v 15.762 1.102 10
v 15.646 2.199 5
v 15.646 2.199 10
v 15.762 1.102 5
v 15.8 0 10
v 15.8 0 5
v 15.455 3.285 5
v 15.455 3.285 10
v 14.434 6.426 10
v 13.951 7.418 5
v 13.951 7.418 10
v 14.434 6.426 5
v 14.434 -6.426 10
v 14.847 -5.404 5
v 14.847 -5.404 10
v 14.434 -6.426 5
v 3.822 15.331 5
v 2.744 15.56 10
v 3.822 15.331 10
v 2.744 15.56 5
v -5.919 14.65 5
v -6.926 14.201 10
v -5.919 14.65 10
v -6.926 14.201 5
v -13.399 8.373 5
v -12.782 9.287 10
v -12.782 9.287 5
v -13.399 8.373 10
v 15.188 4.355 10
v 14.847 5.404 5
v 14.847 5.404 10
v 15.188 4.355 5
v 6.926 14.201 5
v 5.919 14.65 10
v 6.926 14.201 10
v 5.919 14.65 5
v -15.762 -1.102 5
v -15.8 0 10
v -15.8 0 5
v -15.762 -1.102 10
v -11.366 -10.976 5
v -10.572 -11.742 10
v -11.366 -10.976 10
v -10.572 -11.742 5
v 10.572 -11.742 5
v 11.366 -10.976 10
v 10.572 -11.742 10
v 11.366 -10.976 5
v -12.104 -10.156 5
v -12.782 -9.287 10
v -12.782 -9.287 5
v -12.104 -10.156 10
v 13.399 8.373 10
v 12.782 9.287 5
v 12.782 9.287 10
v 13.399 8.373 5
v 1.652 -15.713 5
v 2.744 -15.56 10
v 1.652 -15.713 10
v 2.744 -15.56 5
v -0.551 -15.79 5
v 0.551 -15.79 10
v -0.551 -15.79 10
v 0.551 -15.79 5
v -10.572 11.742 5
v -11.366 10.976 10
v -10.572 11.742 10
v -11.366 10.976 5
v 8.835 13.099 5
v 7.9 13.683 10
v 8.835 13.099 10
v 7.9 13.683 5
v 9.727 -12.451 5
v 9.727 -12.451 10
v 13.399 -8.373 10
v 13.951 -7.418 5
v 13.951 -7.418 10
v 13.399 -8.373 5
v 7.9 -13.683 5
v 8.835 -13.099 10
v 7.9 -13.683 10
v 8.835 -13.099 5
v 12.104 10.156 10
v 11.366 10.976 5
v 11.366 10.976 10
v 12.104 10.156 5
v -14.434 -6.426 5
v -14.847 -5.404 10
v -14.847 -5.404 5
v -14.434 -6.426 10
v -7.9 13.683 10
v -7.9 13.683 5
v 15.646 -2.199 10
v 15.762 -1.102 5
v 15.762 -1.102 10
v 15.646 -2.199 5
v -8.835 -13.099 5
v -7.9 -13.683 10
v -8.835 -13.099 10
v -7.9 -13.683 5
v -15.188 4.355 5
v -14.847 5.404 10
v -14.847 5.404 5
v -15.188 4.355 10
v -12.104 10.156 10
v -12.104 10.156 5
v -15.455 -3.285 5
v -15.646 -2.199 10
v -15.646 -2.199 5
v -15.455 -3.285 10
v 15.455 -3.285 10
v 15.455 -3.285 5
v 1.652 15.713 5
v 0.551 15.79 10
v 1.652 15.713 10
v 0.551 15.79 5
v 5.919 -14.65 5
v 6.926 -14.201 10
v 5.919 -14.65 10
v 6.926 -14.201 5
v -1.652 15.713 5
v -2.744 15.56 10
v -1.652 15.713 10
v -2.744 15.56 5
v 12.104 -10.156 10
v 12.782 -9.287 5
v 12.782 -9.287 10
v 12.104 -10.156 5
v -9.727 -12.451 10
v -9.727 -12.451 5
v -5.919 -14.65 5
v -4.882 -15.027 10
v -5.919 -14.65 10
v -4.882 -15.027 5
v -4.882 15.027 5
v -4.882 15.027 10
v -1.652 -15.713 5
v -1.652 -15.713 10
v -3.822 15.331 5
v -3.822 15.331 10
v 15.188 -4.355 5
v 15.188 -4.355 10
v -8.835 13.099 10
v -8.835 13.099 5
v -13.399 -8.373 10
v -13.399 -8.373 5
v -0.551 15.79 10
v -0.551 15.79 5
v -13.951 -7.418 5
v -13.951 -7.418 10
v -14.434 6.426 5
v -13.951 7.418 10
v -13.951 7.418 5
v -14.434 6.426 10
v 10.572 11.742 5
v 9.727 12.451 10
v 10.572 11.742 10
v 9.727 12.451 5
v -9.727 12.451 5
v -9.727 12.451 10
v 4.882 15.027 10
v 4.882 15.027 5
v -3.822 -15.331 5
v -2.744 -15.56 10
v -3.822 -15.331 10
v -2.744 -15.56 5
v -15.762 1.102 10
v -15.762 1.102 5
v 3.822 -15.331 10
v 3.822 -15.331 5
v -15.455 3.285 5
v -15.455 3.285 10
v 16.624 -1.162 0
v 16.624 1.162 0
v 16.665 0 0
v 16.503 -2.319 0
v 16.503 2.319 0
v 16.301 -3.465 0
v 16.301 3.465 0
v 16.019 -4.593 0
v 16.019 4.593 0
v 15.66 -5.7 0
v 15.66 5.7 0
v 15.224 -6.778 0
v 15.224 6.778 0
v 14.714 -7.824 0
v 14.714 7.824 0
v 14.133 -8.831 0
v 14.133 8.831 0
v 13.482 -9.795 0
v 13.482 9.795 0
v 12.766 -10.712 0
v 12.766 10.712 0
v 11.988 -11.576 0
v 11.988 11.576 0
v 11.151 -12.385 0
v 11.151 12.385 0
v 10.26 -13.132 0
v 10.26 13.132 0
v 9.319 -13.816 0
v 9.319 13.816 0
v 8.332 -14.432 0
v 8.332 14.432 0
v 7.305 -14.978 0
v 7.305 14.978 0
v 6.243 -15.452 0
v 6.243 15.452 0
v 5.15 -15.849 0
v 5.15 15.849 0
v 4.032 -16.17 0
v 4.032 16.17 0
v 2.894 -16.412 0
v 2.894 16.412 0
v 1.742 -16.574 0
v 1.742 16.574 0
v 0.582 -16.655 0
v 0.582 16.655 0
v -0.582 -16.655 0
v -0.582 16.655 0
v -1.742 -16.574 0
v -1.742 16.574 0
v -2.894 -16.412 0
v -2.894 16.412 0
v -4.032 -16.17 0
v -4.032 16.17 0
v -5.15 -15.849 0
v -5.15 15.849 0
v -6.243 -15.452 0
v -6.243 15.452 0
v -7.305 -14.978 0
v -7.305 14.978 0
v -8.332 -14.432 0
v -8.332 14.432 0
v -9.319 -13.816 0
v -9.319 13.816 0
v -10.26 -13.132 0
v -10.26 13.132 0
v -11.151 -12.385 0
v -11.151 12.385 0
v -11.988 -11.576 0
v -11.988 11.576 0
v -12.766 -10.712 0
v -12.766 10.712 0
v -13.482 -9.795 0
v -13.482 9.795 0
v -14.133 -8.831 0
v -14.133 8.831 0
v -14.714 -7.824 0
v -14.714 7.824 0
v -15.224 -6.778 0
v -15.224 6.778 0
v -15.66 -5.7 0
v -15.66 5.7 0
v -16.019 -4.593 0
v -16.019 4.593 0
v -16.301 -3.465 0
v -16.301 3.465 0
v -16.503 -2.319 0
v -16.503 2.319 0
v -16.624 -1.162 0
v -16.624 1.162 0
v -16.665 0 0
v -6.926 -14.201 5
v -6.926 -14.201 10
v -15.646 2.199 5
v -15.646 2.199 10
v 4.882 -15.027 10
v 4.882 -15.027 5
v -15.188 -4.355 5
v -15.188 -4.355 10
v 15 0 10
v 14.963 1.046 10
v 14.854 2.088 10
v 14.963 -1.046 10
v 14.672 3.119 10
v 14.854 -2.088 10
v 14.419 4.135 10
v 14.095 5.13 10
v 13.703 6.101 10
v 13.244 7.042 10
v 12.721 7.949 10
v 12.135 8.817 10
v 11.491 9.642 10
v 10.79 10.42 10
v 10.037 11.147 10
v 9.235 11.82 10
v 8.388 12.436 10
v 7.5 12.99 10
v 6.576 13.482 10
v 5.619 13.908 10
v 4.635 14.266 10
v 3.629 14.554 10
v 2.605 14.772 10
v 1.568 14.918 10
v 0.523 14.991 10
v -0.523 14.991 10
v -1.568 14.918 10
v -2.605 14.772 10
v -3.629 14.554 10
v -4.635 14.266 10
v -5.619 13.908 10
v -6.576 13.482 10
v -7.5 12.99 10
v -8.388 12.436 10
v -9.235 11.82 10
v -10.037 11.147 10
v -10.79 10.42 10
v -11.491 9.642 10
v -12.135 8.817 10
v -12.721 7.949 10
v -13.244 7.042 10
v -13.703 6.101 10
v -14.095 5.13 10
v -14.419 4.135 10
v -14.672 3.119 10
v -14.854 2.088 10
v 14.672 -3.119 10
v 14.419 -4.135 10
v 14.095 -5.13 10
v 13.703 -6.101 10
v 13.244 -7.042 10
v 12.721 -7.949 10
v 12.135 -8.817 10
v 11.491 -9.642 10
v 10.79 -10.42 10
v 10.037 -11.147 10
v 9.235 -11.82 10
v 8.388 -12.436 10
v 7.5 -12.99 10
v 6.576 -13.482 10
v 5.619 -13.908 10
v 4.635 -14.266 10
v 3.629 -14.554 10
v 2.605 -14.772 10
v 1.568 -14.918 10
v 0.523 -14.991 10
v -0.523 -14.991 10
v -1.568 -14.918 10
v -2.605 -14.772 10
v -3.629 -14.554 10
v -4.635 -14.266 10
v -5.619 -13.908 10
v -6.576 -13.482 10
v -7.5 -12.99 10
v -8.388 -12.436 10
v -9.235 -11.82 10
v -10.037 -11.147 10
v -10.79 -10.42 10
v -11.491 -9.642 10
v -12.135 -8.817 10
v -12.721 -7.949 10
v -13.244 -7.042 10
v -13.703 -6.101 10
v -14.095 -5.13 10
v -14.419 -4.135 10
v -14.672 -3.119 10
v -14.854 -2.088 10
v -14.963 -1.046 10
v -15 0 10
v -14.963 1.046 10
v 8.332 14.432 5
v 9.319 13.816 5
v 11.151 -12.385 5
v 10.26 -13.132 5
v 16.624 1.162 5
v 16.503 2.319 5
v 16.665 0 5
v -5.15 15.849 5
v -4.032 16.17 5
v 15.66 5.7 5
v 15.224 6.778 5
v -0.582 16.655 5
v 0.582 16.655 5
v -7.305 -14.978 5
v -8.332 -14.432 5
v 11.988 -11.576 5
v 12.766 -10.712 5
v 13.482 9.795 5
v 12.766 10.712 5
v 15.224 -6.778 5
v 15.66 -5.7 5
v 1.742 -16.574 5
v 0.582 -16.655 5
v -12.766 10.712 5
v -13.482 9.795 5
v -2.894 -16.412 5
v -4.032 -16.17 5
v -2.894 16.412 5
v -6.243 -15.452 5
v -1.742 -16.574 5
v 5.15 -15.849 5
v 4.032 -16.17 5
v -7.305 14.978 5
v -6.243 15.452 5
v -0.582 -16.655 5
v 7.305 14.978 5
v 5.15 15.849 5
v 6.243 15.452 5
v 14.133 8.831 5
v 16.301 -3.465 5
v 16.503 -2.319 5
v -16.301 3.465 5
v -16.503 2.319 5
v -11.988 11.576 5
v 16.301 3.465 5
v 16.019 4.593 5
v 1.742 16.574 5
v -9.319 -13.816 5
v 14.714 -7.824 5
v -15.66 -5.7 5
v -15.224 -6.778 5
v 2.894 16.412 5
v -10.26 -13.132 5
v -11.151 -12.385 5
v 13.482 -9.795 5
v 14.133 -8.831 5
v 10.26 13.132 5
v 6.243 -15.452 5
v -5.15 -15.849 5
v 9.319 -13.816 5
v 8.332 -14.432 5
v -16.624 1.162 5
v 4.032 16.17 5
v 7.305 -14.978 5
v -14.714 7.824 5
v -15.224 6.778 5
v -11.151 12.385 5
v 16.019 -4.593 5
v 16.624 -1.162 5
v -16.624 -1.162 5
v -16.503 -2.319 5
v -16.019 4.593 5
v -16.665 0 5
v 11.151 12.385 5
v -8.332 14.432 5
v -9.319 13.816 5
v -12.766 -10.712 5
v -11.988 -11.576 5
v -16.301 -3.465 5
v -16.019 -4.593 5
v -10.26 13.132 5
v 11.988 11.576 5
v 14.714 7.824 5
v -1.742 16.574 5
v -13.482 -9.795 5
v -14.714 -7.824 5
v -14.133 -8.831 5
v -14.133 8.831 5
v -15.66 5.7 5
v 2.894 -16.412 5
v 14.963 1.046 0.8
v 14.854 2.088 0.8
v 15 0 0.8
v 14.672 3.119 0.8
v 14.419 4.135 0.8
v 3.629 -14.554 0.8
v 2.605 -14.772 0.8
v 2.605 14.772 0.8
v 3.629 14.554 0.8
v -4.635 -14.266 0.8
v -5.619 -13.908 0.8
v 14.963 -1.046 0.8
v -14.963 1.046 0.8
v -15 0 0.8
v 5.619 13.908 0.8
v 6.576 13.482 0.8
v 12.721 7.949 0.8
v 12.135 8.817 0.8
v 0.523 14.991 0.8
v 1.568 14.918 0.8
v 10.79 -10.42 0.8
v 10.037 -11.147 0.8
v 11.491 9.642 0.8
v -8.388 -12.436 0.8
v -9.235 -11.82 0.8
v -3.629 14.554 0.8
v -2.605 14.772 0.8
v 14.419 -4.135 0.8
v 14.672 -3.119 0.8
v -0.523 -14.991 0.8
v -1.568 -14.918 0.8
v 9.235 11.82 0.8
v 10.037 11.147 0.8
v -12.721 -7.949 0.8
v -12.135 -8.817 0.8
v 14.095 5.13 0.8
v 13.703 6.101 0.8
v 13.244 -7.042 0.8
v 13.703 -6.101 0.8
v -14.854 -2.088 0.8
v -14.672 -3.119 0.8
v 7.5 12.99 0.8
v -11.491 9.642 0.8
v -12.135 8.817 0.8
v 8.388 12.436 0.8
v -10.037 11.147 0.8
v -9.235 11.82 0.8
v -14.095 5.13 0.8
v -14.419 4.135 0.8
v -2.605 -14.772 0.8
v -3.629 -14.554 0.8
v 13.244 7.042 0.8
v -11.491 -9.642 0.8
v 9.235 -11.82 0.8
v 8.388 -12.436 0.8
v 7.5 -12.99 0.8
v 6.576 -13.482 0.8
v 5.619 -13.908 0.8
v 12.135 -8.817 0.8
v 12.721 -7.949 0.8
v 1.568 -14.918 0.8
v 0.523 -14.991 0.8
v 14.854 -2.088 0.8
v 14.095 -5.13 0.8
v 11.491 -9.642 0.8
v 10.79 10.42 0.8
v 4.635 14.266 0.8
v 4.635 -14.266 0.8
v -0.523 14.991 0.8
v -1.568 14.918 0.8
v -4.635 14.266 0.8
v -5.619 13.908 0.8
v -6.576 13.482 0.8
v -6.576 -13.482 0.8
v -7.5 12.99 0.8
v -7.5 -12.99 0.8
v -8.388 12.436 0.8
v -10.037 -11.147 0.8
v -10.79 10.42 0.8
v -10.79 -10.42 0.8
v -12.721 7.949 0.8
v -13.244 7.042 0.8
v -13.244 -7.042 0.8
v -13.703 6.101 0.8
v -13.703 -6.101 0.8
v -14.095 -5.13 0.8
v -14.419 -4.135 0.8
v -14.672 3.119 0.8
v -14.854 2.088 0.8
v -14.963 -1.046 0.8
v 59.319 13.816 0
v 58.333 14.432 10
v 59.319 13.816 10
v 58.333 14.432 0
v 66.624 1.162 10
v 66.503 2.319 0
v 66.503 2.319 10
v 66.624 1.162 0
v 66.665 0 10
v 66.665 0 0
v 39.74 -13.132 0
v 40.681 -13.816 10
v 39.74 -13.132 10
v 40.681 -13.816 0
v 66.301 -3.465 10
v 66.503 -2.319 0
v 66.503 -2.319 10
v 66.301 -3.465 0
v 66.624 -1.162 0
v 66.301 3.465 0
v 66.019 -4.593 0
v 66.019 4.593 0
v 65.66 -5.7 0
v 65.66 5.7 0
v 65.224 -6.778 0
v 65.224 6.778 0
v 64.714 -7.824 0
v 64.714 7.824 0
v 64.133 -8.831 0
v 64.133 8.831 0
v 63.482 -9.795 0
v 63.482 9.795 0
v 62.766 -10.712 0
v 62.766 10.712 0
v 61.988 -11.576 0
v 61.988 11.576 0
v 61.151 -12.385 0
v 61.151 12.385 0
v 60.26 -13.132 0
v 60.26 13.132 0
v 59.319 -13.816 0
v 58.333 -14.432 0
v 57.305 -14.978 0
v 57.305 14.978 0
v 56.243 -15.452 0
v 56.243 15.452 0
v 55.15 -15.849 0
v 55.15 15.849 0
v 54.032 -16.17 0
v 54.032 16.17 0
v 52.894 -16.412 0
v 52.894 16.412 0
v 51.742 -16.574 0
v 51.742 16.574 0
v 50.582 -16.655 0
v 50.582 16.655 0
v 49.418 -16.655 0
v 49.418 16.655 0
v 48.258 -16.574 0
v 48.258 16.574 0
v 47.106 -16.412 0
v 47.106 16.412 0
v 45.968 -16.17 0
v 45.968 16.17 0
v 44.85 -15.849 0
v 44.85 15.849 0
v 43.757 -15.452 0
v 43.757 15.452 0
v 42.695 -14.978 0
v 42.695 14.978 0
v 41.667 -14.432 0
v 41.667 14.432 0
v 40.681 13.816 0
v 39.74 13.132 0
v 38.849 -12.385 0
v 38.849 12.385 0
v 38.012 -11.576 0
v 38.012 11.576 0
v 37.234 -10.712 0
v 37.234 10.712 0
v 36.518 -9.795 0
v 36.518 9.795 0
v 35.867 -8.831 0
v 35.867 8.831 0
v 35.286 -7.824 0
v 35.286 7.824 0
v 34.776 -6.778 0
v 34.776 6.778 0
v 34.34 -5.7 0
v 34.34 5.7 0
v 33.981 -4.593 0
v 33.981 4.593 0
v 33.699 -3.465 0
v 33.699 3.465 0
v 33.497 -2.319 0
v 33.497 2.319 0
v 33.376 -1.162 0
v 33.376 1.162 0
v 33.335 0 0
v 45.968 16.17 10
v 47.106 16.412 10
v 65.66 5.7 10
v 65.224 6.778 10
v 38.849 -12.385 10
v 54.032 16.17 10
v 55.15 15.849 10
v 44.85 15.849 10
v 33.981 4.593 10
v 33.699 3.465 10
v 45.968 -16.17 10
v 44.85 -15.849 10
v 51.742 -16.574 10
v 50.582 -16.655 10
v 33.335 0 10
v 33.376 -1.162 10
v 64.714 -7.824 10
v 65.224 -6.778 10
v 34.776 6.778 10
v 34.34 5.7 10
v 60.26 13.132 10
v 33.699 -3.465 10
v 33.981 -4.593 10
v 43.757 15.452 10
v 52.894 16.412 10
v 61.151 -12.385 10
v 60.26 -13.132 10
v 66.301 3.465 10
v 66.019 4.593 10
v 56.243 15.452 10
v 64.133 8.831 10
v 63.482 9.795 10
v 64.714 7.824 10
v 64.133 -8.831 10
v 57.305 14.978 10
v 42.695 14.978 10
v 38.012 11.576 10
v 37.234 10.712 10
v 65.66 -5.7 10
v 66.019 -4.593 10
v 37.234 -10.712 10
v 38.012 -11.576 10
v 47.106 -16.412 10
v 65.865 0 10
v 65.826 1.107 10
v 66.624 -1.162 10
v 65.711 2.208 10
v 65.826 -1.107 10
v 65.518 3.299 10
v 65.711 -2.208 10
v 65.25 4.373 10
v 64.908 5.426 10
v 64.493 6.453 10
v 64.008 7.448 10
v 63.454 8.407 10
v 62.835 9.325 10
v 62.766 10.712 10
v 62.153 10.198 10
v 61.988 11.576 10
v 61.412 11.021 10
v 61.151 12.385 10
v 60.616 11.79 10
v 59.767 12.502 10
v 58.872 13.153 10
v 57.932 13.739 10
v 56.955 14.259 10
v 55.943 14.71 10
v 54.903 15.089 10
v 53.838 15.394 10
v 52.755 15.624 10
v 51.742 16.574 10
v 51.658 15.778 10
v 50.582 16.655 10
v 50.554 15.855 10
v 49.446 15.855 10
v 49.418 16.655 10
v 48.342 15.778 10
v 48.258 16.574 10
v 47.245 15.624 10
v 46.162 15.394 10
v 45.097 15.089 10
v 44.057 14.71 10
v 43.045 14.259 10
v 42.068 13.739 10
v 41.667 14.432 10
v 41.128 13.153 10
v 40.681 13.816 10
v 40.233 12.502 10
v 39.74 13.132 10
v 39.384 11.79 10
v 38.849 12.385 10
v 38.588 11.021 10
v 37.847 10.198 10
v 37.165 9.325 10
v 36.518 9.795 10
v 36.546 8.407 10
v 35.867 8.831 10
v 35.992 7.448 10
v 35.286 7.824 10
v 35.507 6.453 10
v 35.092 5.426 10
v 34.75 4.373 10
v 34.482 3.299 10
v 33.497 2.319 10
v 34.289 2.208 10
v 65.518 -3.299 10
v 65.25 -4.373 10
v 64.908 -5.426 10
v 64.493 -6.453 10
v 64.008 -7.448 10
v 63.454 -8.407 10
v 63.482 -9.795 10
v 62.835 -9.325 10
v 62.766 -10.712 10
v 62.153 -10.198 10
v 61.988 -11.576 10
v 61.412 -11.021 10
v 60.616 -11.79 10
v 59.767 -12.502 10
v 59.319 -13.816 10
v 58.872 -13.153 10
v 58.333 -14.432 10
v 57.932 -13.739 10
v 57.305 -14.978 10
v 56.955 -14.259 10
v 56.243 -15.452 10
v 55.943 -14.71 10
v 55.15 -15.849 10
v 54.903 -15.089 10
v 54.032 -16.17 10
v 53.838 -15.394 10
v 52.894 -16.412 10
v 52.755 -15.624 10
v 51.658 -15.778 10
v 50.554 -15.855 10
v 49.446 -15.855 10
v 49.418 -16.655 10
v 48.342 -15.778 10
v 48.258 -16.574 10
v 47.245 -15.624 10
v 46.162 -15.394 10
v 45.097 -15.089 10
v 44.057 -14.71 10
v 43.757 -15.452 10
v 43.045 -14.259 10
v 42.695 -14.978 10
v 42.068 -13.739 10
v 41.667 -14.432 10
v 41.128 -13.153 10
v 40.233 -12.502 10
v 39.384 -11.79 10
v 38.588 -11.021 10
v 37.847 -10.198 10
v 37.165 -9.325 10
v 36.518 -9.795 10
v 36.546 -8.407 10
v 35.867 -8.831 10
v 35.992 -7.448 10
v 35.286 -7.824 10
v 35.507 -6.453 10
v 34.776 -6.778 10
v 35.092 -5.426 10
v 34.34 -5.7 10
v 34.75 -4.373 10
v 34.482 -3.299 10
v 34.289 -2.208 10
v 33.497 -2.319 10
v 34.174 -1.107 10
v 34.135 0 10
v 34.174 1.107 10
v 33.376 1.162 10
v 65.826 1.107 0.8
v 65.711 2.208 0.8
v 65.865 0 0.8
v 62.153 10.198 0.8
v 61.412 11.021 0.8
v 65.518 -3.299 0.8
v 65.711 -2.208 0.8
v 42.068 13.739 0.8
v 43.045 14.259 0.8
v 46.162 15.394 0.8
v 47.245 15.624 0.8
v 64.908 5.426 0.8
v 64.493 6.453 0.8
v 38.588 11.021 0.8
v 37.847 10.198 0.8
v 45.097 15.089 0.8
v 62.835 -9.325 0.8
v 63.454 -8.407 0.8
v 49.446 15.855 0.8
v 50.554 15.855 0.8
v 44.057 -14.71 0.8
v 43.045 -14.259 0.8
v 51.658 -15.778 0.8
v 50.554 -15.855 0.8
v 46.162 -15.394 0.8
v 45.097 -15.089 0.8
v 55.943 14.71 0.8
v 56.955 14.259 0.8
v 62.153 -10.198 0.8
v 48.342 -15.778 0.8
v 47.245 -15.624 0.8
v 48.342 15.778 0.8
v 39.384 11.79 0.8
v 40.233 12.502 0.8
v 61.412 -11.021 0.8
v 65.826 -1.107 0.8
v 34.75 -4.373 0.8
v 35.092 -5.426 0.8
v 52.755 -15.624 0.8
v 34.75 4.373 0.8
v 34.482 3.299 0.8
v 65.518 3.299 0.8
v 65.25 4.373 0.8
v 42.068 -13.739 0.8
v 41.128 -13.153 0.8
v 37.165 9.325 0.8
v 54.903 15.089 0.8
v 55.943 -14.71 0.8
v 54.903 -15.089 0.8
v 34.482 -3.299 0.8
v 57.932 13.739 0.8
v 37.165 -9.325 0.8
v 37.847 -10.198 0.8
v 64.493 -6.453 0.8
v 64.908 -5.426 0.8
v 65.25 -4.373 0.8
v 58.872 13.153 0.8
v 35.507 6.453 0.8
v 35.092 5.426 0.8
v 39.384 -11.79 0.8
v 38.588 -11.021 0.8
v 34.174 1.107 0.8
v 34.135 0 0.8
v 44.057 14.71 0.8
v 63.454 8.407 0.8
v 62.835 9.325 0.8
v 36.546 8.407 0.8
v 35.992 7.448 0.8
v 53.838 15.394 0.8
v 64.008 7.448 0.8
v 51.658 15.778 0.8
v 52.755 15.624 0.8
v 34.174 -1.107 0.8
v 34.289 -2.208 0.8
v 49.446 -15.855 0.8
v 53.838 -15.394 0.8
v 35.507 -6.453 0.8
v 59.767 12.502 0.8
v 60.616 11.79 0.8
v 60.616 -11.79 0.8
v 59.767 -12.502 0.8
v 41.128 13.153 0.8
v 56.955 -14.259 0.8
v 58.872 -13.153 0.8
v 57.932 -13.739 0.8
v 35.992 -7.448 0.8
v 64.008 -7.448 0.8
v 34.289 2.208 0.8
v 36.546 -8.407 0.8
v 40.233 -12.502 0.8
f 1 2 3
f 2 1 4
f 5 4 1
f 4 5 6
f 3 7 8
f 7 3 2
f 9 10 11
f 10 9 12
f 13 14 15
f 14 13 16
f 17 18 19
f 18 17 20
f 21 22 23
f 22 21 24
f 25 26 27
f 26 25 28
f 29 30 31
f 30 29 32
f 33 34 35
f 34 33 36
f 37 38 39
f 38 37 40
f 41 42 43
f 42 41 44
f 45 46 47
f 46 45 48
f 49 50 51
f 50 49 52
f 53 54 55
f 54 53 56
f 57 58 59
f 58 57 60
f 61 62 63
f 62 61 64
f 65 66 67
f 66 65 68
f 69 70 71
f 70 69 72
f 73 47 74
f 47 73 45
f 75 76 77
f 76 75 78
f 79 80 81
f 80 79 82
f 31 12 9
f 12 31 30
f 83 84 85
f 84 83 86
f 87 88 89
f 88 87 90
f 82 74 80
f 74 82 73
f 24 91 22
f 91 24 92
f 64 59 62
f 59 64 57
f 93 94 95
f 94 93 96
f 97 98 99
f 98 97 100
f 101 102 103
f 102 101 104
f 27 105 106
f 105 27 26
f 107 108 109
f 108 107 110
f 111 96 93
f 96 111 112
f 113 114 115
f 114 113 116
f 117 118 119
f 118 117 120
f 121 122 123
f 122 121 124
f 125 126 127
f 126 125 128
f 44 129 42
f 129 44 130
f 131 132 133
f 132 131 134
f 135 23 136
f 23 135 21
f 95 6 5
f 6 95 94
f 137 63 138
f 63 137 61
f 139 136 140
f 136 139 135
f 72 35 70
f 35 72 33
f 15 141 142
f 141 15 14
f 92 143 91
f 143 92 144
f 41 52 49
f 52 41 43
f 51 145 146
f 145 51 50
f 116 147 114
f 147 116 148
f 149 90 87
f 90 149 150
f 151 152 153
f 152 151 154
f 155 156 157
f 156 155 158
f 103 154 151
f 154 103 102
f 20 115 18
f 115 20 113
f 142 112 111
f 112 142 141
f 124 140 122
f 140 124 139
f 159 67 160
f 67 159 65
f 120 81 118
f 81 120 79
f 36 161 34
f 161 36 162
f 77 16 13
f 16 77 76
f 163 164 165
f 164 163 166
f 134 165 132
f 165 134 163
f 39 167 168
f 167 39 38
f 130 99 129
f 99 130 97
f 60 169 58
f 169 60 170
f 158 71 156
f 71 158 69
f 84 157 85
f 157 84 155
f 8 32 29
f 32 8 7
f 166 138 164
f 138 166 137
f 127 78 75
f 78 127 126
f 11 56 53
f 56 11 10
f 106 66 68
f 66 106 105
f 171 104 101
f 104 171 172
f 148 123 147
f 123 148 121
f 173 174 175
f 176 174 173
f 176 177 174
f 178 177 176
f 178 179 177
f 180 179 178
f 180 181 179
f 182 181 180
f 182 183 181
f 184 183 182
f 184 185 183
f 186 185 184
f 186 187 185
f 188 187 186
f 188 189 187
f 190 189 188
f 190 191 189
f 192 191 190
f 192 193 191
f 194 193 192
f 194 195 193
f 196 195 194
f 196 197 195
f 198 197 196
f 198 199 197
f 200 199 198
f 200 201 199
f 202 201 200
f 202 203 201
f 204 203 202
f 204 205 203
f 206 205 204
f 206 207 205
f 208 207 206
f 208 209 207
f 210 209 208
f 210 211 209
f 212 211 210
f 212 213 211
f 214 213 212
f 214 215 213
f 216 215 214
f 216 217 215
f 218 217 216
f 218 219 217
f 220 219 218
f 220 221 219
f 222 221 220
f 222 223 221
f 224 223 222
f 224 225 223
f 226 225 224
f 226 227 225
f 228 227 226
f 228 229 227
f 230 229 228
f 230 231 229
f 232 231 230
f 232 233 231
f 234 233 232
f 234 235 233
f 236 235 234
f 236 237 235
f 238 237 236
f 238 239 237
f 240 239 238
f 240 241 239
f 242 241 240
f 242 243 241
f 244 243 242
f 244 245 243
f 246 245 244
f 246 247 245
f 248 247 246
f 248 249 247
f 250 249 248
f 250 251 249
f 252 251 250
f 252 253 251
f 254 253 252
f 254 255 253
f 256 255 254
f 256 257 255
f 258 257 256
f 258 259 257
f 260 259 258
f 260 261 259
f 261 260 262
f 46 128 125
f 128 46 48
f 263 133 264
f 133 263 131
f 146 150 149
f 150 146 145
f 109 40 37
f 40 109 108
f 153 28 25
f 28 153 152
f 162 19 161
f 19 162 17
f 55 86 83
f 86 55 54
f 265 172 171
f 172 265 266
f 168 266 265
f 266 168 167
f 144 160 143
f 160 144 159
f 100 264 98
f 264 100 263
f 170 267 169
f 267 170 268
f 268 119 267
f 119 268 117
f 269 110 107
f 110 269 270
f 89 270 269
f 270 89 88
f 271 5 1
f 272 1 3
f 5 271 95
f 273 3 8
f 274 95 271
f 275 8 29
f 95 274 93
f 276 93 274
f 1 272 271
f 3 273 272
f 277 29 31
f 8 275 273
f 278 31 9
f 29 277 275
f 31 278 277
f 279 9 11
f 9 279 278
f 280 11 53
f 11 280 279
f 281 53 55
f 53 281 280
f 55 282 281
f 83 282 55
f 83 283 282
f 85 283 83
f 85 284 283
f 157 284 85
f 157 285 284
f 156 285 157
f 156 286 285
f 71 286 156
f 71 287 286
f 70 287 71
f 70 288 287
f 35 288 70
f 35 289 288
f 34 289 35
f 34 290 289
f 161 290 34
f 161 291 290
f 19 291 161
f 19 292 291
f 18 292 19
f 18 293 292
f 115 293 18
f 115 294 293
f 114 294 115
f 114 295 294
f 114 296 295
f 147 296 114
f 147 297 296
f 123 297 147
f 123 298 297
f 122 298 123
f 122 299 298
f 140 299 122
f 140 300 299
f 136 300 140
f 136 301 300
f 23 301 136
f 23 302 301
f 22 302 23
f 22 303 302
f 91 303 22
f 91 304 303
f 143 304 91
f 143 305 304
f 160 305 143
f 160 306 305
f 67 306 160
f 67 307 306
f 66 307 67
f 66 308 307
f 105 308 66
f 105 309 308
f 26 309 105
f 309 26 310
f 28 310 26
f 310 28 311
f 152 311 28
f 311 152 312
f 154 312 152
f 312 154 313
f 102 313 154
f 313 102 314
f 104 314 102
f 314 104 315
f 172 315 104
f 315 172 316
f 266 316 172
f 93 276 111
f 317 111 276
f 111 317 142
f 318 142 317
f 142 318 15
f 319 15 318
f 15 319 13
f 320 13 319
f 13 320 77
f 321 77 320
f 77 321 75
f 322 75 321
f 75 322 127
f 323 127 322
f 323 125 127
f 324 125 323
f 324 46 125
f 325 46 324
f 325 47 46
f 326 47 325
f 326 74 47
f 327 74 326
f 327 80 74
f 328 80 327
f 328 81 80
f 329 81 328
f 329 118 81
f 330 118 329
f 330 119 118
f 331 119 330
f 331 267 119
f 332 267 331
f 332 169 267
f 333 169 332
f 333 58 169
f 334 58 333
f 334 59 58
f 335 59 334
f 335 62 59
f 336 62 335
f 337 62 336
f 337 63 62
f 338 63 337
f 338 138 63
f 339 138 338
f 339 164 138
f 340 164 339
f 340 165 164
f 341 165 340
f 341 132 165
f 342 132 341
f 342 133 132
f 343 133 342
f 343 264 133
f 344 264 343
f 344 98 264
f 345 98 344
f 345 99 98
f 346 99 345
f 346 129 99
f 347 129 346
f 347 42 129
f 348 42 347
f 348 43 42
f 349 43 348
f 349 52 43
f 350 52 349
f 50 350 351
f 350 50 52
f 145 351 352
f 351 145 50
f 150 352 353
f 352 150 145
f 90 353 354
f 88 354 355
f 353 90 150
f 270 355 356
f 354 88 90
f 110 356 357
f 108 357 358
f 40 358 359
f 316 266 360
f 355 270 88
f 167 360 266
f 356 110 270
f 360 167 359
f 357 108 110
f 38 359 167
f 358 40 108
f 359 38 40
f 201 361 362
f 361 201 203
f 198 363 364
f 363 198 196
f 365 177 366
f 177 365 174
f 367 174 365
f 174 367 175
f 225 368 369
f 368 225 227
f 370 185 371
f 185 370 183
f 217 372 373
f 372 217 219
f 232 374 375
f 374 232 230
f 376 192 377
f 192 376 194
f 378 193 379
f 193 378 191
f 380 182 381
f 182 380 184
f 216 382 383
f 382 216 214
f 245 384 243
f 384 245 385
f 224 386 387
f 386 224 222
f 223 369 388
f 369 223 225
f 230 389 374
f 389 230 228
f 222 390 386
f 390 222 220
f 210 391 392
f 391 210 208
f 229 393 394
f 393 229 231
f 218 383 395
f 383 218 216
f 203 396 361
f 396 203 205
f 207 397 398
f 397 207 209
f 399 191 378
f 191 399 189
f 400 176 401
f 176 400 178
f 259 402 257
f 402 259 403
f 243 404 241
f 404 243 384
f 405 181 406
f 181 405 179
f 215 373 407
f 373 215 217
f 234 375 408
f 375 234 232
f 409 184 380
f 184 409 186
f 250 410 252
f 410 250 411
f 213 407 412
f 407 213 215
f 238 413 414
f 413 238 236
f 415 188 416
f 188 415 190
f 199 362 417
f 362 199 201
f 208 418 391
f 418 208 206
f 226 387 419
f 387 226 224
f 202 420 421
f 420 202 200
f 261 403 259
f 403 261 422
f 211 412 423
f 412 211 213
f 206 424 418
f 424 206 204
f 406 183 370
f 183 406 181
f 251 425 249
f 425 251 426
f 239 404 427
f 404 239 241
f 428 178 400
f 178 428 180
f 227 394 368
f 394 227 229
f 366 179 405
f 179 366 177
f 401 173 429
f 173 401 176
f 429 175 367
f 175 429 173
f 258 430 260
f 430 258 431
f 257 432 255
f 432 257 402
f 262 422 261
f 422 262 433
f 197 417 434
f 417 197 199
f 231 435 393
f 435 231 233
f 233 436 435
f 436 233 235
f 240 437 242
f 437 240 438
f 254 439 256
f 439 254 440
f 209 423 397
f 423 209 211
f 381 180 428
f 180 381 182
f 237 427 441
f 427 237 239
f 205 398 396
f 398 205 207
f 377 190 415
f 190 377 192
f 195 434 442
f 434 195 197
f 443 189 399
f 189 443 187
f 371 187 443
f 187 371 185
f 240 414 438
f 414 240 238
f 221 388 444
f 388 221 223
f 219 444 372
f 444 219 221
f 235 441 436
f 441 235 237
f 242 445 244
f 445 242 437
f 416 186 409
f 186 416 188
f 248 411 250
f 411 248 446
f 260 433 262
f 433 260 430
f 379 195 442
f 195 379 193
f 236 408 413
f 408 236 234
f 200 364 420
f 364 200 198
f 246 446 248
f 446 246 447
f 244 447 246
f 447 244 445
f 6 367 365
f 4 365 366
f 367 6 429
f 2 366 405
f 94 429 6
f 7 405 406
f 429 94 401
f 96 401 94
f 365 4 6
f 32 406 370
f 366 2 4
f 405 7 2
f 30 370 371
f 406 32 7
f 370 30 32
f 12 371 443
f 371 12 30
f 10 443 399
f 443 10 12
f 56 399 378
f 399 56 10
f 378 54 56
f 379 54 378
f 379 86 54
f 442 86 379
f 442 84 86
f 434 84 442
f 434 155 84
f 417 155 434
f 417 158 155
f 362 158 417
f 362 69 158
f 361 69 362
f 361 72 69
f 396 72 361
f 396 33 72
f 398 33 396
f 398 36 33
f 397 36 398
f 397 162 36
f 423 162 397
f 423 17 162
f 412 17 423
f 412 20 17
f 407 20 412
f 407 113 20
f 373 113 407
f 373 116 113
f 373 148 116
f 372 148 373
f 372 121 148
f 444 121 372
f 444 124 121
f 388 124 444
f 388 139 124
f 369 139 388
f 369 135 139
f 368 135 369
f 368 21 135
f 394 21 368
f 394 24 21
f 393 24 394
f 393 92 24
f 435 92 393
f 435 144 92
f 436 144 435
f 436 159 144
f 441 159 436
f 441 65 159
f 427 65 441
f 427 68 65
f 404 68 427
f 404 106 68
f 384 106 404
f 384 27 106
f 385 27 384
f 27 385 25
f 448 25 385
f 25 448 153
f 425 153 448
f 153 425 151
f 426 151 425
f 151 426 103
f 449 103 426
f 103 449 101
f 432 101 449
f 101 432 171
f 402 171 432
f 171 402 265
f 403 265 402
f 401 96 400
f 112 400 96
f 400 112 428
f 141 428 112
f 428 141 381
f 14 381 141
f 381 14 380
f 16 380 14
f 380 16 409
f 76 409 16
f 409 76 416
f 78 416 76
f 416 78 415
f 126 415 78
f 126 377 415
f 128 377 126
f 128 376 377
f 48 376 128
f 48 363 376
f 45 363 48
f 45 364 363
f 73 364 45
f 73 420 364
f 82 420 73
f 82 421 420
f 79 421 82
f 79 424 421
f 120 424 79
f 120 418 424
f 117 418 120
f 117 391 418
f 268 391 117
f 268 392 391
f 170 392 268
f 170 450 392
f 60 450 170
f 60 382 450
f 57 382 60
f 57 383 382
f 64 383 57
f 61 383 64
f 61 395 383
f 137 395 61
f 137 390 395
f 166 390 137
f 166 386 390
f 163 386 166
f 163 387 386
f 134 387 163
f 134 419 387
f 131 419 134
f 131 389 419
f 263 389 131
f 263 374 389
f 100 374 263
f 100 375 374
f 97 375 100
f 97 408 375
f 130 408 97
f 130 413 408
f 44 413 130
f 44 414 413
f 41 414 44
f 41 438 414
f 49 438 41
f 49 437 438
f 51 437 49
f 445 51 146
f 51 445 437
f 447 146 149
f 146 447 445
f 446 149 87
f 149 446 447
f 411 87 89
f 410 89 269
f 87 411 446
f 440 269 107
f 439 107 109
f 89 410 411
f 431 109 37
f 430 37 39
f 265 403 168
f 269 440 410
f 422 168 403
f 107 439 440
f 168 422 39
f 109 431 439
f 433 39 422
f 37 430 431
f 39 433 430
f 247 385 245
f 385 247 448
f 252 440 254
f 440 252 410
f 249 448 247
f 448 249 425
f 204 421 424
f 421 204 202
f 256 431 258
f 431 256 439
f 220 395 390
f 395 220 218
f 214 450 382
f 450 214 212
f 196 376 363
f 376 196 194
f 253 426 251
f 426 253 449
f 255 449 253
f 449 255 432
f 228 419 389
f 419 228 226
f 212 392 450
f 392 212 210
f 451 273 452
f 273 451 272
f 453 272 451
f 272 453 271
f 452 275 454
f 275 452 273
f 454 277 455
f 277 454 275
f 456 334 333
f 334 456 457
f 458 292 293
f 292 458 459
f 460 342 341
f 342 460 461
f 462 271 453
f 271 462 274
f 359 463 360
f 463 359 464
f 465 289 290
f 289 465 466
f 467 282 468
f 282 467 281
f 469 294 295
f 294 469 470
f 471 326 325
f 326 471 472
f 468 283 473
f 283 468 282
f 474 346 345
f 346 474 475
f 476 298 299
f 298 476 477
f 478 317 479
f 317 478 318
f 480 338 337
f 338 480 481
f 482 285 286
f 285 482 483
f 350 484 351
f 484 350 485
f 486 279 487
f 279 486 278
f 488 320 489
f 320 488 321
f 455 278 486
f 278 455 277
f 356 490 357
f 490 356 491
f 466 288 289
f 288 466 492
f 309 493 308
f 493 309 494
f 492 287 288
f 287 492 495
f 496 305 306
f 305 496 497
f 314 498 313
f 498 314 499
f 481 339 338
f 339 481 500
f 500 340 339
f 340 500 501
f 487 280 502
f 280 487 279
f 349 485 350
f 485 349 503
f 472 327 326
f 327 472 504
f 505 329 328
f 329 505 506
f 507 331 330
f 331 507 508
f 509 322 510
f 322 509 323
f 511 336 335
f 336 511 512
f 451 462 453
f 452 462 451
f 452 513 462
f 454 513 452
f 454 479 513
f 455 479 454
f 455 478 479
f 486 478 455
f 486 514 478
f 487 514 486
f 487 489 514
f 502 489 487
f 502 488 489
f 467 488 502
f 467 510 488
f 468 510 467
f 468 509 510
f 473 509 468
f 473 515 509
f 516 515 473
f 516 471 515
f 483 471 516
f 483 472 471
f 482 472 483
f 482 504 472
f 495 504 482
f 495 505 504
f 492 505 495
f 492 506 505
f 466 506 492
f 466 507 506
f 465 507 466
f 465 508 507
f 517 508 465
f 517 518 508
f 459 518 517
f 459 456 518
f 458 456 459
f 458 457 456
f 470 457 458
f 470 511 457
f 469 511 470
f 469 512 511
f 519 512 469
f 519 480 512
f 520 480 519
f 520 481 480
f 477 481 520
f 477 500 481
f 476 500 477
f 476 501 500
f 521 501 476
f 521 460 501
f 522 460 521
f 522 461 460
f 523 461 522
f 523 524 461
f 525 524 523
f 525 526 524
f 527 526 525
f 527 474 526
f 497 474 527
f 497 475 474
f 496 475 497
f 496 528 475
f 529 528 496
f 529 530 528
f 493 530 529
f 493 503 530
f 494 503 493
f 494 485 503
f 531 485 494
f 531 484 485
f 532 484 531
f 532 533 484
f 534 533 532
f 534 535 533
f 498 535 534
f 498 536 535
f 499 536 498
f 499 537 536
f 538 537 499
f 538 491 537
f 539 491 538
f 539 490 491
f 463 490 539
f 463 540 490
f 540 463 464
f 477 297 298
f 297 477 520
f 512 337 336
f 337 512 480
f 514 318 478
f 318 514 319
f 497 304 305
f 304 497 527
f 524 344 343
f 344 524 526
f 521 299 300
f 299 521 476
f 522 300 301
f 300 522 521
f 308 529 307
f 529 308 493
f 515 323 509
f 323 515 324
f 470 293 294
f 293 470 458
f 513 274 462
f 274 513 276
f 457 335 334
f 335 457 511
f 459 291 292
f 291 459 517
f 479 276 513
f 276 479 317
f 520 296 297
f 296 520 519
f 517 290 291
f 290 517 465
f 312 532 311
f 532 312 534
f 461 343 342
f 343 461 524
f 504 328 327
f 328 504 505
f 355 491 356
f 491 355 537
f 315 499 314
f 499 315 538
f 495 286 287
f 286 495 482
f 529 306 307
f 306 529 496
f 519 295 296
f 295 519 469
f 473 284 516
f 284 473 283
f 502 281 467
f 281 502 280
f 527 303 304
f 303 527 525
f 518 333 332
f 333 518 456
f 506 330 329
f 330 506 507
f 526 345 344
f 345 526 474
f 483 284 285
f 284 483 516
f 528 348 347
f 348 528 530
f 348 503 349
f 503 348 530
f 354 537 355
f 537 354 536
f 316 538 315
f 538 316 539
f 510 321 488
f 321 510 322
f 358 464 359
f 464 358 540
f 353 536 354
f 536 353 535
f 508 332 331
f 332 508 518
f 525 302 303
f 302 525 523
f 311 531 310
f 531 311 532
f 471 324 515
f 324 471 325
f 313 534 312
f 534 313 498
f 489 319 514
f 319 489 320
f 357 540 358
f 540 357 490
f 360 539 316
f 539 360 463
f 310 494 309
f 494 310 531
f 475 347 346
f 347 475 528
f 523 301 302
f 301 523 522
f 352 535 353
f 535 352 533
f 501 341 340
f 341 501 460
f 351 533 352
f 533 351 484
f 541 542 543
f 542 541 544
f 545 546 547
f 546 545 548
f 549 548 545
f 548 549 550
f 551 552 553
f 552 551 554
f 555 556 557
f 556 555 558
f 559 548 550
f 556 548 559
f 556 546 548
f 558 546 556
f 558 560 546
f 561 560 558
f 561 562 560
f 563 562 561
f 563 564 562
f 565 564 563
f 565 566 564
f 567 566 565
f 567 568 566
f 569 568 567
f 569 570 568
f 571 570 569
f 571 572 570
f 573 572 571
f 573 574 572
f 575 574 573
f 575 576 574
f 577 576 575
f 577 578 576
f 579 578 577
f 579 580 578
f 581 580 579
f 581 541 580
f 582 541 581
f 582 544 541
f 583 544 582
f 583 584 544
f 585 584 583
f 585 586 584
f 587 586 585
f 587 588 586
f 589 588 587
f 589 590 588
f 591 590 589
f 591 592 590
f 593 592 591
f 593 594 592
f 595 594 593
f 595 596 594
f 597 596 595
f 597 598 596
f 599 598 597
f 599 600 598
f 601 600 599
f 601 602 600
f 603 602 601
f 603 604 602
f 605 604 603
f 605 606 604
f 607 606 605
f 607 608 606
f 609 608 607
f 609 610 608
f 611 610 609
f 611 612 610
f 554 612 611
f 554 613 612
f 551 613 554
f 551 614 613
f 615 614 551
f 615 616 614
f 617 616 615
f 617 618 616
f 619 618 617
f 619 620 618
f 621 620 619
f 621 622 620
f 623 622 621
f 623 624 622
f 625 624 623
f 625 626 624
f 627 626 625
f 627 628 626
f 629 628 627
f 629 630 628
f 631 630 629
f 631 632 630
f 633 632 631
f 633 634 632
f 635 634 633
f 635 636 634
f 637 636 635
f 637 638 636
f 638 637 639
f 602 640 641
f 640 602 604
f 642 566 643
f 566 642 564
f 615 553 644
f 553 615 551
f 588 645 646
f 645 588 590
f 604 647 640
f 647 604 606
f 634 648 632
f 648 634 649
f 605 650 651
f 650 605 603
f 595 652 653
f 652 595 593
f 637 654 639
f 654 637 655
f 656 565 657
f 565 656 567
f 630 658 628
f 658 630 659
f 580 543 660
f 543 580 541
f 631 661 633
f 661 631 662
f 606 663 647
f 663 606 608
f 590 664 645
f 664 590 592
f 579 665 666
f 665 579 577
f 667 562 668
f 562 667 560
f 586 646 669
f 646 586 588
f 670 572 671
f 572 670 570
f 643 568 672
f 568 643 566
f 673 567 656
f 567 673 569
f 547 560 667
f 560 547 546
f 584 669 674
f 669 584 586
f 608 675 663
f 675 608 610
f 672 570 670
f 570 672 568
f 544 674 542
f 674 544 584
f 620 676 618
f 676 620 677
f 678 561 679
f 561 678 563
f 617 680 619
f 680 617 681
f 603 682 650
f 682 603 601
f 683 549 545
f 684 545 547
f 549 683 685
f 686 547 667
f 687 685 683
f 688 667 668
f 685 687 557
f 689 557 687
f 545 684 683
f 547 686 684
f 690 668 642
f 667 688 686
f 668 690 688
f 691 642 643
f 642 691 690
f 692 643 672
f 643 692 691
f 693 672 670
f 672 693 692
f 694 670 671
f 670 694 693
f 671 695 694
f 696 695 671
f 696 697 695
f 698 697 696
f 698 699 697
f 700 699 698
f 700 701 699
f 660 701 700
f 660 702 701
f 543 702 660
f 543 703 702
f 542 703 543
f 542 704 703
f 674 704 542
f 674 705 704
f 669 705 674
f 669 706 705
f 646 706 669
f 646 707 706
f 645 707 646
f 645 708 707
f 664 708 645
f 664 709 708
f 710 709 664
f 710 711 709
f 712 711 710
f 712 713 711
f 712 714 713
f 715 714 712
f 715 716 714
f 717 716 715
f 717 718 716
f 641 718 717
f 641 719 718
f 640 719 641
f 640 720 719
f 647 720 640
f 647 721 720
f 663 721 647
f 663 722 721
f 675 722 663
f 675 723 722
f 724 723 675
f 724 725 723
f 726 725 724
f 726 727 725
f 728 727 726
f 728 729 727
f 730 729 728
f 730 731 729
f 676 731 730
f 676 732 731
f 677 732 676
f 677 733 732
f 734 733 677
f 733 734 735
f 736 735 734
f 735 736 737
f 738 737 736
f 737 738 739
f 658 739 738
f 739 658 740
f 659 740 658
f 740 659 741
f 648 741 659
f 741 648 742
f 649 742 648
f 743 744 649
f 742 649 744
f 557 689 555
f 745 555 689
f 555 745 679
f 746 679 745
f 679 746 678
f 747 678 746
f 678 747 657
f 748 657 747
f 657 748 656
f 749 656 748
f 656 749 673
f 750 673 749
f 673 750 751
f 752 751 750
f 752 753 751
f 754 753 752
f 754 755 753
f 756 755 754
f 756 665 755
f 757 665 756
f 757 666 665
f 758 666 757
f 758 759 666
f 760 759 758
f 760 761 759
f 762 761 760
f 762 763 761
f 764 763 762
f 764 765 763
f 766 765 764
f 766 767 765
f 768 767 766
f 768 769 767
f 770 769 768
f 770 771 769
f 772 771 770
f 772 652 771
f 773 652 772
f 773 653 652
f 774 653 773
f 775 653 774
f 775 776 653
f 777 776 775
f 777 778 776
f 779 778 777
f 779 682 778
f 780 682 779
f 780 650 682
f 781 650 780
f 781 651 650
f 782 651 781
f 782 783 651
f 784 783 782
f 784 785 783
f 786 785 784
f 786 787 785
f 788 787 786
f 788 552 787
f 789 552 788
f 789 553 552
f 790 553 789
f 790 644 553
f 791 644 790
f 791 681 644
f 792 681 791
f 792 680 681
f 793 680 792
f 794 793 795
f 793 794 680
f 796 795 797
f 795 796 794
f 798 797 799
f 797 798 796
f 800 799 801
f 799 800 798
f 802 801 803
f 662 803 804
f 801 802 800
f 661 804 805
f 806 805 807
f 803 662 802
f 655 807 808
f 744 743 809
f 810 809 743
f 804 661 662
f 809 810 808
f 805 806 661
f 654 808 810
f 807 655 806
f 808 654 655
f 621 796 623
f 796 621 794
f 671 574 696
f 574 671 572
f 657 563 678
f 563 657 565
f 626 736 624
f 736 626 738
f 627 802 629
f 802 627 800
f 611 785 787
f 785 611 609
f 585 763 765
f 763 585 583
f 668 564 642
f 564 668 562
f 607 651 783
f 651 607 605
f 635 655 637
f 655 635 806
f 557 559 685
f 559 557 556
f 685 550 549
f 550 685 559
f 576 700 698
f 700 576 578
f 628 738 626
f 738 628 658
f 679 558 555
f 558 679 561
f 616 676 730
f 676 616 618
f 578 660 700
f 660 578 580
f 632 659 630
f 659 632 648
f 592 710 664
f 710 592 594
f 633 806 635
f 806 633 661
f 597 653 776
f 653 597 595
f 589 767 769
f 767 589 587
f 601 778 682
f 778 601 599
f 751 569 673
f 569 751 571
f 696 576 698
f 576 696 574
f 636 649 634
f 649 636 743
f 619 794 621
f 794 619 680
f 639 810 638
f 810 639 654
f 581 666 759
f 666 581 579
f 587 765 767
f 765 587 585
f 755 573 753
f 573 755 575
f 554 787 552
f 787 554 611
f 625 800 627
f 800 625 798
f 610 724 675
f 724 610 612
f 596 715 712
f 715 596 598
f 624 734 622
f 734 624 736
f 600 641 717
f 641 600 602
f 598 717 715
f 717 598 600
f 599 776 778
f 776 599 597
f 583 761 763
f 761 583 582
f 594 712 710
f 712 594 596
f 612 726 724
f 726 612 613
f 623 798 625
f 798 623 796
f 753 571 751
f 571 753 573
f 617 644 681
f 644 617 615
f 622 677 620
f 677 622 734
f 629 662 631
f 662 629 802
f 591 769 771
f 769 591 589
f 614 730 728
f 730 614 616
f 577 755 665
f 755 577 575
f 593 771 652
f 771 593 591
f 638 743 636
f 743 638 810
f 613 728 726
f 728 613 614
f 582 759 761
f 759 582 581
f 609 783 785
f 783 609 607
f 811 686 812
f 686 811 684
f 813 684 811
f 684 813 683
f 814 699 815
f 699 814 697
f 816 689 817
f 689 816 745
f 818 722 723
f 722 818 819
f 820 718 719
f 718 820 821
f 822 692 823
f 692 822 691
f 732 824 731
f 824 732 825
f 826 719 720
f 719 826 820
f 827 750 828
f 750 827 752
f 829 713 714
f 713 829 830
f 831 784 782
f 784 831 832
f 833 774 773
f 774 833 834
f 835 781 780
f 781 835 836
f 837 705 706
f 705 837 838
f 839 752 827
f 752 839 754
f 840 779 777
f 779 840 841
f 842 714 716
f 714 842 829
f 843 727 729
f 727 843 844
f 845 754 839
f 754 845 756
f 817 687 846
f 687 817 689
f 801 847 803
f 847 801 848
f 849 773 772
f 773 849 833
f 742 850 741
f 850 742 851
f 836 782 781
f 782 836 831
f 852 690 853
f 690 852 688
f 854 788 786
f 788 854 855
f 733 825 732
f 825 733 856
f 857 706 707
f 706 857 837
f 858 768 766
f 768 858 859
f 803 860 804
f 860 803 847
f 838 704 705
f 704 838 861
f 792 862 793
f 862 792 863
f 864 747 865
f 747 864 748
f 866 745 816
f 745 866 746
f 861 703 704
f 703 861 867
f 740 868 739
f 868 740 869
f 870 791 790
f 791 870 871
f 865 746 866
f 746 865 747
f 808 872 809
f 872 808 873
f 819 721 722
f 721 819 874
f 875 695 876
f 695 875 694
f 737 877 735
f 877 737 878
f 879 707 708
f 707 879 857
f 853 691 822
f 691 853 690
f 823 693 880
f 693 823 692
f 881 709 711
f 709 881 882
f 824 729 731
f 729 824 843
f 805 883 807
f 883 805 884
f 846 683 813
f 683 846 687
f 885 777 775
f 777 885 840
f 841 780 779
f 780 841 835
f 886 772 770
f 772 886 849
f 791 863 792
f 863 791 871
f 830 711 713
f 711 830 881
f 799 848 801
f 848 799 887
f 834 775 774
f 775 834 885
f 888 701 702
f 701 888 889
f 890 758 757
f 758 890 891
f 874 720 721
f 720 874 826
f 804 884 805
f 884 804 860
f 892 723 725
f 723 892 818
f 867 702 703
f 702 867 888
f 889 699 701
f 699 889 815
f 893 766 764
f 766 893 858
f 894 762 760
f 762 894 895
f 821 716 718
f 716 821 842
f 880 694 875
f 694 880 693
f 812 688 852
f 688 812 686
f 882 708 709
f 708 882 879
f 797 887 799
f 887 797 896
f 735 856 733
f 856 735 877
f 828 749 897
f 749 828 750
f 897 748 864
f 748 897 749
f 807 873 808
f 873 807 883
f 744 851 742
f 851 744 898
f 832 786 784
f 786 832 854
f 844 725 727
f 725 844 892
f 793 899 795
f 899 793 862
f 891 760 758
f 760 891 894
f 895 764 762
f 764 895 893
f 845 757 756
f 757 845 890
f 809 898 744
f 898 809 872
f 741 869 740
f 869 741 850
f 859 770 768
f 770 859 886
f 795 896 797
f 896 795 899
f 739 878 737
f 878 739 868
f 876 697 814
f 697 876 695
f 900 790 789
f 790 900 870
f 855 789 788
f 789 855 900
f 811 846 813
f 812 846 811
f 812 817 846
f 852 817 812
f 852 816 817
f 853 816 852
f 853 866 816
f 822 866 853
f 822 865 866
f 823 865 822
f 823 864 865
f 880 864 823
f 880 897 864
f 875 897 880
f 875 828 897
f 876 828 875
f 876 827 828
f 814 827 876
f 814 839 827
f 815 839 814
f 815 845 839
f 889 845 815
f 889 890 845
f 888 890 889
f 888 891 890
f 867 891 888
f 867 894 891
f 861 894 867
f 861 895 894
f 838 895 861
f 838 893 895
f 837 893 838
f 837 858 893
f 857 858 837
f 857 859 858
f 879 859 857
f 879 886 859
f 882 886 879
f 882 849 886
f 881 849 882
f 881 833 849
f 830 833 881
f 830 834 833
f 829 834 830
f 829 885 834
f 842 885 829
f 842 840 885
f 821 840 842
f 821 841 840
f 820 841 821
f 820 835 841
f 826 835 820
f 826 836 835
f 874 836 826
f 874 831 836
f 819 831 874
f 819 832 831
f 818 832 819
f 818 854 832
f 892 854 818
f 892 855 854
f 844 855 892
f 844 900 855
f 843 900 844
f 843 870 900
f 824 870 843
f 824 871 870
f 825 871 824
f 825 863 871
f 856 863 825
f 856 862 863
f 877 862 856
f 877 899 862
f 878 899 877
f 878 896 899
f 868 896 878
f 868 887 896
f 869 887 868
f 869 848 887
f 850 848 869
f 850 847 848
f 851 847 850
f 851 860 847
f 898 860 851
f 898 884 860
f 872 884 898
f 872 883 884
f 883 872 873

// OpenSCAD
$fa=4; // default minimum facet angle is now 4
$fs=0.05; // default minimum facet size is now 0.05 mm

innerRad = 15;
bottomHeight = 10;
totalHeight = 15;
wallThickness = .8;
tolerance = .065;
divideHeight = 5;

difference() {
  union() {
    cylinder(r=innerRad + wallThickness, h = bottomHeight);
    cylinder(r=innerRad + tolerance + wallThickness * 2, h = divideHeight);
  }
  translate([0, 0, wallThickness]) cylinder(r=innerRad, h = bottomHeight + .1);
}

translate([50, 0, 0]) difference() {
  cylinder(r = innerRad + wallThickness*2 + tolerance, h = totalHeight - divideHeight);
  translate([0, 0, wallThickness]) cylinder(r = innerRad + wallThickness + tolerance, h = totalHeight - divideHeight);
}
